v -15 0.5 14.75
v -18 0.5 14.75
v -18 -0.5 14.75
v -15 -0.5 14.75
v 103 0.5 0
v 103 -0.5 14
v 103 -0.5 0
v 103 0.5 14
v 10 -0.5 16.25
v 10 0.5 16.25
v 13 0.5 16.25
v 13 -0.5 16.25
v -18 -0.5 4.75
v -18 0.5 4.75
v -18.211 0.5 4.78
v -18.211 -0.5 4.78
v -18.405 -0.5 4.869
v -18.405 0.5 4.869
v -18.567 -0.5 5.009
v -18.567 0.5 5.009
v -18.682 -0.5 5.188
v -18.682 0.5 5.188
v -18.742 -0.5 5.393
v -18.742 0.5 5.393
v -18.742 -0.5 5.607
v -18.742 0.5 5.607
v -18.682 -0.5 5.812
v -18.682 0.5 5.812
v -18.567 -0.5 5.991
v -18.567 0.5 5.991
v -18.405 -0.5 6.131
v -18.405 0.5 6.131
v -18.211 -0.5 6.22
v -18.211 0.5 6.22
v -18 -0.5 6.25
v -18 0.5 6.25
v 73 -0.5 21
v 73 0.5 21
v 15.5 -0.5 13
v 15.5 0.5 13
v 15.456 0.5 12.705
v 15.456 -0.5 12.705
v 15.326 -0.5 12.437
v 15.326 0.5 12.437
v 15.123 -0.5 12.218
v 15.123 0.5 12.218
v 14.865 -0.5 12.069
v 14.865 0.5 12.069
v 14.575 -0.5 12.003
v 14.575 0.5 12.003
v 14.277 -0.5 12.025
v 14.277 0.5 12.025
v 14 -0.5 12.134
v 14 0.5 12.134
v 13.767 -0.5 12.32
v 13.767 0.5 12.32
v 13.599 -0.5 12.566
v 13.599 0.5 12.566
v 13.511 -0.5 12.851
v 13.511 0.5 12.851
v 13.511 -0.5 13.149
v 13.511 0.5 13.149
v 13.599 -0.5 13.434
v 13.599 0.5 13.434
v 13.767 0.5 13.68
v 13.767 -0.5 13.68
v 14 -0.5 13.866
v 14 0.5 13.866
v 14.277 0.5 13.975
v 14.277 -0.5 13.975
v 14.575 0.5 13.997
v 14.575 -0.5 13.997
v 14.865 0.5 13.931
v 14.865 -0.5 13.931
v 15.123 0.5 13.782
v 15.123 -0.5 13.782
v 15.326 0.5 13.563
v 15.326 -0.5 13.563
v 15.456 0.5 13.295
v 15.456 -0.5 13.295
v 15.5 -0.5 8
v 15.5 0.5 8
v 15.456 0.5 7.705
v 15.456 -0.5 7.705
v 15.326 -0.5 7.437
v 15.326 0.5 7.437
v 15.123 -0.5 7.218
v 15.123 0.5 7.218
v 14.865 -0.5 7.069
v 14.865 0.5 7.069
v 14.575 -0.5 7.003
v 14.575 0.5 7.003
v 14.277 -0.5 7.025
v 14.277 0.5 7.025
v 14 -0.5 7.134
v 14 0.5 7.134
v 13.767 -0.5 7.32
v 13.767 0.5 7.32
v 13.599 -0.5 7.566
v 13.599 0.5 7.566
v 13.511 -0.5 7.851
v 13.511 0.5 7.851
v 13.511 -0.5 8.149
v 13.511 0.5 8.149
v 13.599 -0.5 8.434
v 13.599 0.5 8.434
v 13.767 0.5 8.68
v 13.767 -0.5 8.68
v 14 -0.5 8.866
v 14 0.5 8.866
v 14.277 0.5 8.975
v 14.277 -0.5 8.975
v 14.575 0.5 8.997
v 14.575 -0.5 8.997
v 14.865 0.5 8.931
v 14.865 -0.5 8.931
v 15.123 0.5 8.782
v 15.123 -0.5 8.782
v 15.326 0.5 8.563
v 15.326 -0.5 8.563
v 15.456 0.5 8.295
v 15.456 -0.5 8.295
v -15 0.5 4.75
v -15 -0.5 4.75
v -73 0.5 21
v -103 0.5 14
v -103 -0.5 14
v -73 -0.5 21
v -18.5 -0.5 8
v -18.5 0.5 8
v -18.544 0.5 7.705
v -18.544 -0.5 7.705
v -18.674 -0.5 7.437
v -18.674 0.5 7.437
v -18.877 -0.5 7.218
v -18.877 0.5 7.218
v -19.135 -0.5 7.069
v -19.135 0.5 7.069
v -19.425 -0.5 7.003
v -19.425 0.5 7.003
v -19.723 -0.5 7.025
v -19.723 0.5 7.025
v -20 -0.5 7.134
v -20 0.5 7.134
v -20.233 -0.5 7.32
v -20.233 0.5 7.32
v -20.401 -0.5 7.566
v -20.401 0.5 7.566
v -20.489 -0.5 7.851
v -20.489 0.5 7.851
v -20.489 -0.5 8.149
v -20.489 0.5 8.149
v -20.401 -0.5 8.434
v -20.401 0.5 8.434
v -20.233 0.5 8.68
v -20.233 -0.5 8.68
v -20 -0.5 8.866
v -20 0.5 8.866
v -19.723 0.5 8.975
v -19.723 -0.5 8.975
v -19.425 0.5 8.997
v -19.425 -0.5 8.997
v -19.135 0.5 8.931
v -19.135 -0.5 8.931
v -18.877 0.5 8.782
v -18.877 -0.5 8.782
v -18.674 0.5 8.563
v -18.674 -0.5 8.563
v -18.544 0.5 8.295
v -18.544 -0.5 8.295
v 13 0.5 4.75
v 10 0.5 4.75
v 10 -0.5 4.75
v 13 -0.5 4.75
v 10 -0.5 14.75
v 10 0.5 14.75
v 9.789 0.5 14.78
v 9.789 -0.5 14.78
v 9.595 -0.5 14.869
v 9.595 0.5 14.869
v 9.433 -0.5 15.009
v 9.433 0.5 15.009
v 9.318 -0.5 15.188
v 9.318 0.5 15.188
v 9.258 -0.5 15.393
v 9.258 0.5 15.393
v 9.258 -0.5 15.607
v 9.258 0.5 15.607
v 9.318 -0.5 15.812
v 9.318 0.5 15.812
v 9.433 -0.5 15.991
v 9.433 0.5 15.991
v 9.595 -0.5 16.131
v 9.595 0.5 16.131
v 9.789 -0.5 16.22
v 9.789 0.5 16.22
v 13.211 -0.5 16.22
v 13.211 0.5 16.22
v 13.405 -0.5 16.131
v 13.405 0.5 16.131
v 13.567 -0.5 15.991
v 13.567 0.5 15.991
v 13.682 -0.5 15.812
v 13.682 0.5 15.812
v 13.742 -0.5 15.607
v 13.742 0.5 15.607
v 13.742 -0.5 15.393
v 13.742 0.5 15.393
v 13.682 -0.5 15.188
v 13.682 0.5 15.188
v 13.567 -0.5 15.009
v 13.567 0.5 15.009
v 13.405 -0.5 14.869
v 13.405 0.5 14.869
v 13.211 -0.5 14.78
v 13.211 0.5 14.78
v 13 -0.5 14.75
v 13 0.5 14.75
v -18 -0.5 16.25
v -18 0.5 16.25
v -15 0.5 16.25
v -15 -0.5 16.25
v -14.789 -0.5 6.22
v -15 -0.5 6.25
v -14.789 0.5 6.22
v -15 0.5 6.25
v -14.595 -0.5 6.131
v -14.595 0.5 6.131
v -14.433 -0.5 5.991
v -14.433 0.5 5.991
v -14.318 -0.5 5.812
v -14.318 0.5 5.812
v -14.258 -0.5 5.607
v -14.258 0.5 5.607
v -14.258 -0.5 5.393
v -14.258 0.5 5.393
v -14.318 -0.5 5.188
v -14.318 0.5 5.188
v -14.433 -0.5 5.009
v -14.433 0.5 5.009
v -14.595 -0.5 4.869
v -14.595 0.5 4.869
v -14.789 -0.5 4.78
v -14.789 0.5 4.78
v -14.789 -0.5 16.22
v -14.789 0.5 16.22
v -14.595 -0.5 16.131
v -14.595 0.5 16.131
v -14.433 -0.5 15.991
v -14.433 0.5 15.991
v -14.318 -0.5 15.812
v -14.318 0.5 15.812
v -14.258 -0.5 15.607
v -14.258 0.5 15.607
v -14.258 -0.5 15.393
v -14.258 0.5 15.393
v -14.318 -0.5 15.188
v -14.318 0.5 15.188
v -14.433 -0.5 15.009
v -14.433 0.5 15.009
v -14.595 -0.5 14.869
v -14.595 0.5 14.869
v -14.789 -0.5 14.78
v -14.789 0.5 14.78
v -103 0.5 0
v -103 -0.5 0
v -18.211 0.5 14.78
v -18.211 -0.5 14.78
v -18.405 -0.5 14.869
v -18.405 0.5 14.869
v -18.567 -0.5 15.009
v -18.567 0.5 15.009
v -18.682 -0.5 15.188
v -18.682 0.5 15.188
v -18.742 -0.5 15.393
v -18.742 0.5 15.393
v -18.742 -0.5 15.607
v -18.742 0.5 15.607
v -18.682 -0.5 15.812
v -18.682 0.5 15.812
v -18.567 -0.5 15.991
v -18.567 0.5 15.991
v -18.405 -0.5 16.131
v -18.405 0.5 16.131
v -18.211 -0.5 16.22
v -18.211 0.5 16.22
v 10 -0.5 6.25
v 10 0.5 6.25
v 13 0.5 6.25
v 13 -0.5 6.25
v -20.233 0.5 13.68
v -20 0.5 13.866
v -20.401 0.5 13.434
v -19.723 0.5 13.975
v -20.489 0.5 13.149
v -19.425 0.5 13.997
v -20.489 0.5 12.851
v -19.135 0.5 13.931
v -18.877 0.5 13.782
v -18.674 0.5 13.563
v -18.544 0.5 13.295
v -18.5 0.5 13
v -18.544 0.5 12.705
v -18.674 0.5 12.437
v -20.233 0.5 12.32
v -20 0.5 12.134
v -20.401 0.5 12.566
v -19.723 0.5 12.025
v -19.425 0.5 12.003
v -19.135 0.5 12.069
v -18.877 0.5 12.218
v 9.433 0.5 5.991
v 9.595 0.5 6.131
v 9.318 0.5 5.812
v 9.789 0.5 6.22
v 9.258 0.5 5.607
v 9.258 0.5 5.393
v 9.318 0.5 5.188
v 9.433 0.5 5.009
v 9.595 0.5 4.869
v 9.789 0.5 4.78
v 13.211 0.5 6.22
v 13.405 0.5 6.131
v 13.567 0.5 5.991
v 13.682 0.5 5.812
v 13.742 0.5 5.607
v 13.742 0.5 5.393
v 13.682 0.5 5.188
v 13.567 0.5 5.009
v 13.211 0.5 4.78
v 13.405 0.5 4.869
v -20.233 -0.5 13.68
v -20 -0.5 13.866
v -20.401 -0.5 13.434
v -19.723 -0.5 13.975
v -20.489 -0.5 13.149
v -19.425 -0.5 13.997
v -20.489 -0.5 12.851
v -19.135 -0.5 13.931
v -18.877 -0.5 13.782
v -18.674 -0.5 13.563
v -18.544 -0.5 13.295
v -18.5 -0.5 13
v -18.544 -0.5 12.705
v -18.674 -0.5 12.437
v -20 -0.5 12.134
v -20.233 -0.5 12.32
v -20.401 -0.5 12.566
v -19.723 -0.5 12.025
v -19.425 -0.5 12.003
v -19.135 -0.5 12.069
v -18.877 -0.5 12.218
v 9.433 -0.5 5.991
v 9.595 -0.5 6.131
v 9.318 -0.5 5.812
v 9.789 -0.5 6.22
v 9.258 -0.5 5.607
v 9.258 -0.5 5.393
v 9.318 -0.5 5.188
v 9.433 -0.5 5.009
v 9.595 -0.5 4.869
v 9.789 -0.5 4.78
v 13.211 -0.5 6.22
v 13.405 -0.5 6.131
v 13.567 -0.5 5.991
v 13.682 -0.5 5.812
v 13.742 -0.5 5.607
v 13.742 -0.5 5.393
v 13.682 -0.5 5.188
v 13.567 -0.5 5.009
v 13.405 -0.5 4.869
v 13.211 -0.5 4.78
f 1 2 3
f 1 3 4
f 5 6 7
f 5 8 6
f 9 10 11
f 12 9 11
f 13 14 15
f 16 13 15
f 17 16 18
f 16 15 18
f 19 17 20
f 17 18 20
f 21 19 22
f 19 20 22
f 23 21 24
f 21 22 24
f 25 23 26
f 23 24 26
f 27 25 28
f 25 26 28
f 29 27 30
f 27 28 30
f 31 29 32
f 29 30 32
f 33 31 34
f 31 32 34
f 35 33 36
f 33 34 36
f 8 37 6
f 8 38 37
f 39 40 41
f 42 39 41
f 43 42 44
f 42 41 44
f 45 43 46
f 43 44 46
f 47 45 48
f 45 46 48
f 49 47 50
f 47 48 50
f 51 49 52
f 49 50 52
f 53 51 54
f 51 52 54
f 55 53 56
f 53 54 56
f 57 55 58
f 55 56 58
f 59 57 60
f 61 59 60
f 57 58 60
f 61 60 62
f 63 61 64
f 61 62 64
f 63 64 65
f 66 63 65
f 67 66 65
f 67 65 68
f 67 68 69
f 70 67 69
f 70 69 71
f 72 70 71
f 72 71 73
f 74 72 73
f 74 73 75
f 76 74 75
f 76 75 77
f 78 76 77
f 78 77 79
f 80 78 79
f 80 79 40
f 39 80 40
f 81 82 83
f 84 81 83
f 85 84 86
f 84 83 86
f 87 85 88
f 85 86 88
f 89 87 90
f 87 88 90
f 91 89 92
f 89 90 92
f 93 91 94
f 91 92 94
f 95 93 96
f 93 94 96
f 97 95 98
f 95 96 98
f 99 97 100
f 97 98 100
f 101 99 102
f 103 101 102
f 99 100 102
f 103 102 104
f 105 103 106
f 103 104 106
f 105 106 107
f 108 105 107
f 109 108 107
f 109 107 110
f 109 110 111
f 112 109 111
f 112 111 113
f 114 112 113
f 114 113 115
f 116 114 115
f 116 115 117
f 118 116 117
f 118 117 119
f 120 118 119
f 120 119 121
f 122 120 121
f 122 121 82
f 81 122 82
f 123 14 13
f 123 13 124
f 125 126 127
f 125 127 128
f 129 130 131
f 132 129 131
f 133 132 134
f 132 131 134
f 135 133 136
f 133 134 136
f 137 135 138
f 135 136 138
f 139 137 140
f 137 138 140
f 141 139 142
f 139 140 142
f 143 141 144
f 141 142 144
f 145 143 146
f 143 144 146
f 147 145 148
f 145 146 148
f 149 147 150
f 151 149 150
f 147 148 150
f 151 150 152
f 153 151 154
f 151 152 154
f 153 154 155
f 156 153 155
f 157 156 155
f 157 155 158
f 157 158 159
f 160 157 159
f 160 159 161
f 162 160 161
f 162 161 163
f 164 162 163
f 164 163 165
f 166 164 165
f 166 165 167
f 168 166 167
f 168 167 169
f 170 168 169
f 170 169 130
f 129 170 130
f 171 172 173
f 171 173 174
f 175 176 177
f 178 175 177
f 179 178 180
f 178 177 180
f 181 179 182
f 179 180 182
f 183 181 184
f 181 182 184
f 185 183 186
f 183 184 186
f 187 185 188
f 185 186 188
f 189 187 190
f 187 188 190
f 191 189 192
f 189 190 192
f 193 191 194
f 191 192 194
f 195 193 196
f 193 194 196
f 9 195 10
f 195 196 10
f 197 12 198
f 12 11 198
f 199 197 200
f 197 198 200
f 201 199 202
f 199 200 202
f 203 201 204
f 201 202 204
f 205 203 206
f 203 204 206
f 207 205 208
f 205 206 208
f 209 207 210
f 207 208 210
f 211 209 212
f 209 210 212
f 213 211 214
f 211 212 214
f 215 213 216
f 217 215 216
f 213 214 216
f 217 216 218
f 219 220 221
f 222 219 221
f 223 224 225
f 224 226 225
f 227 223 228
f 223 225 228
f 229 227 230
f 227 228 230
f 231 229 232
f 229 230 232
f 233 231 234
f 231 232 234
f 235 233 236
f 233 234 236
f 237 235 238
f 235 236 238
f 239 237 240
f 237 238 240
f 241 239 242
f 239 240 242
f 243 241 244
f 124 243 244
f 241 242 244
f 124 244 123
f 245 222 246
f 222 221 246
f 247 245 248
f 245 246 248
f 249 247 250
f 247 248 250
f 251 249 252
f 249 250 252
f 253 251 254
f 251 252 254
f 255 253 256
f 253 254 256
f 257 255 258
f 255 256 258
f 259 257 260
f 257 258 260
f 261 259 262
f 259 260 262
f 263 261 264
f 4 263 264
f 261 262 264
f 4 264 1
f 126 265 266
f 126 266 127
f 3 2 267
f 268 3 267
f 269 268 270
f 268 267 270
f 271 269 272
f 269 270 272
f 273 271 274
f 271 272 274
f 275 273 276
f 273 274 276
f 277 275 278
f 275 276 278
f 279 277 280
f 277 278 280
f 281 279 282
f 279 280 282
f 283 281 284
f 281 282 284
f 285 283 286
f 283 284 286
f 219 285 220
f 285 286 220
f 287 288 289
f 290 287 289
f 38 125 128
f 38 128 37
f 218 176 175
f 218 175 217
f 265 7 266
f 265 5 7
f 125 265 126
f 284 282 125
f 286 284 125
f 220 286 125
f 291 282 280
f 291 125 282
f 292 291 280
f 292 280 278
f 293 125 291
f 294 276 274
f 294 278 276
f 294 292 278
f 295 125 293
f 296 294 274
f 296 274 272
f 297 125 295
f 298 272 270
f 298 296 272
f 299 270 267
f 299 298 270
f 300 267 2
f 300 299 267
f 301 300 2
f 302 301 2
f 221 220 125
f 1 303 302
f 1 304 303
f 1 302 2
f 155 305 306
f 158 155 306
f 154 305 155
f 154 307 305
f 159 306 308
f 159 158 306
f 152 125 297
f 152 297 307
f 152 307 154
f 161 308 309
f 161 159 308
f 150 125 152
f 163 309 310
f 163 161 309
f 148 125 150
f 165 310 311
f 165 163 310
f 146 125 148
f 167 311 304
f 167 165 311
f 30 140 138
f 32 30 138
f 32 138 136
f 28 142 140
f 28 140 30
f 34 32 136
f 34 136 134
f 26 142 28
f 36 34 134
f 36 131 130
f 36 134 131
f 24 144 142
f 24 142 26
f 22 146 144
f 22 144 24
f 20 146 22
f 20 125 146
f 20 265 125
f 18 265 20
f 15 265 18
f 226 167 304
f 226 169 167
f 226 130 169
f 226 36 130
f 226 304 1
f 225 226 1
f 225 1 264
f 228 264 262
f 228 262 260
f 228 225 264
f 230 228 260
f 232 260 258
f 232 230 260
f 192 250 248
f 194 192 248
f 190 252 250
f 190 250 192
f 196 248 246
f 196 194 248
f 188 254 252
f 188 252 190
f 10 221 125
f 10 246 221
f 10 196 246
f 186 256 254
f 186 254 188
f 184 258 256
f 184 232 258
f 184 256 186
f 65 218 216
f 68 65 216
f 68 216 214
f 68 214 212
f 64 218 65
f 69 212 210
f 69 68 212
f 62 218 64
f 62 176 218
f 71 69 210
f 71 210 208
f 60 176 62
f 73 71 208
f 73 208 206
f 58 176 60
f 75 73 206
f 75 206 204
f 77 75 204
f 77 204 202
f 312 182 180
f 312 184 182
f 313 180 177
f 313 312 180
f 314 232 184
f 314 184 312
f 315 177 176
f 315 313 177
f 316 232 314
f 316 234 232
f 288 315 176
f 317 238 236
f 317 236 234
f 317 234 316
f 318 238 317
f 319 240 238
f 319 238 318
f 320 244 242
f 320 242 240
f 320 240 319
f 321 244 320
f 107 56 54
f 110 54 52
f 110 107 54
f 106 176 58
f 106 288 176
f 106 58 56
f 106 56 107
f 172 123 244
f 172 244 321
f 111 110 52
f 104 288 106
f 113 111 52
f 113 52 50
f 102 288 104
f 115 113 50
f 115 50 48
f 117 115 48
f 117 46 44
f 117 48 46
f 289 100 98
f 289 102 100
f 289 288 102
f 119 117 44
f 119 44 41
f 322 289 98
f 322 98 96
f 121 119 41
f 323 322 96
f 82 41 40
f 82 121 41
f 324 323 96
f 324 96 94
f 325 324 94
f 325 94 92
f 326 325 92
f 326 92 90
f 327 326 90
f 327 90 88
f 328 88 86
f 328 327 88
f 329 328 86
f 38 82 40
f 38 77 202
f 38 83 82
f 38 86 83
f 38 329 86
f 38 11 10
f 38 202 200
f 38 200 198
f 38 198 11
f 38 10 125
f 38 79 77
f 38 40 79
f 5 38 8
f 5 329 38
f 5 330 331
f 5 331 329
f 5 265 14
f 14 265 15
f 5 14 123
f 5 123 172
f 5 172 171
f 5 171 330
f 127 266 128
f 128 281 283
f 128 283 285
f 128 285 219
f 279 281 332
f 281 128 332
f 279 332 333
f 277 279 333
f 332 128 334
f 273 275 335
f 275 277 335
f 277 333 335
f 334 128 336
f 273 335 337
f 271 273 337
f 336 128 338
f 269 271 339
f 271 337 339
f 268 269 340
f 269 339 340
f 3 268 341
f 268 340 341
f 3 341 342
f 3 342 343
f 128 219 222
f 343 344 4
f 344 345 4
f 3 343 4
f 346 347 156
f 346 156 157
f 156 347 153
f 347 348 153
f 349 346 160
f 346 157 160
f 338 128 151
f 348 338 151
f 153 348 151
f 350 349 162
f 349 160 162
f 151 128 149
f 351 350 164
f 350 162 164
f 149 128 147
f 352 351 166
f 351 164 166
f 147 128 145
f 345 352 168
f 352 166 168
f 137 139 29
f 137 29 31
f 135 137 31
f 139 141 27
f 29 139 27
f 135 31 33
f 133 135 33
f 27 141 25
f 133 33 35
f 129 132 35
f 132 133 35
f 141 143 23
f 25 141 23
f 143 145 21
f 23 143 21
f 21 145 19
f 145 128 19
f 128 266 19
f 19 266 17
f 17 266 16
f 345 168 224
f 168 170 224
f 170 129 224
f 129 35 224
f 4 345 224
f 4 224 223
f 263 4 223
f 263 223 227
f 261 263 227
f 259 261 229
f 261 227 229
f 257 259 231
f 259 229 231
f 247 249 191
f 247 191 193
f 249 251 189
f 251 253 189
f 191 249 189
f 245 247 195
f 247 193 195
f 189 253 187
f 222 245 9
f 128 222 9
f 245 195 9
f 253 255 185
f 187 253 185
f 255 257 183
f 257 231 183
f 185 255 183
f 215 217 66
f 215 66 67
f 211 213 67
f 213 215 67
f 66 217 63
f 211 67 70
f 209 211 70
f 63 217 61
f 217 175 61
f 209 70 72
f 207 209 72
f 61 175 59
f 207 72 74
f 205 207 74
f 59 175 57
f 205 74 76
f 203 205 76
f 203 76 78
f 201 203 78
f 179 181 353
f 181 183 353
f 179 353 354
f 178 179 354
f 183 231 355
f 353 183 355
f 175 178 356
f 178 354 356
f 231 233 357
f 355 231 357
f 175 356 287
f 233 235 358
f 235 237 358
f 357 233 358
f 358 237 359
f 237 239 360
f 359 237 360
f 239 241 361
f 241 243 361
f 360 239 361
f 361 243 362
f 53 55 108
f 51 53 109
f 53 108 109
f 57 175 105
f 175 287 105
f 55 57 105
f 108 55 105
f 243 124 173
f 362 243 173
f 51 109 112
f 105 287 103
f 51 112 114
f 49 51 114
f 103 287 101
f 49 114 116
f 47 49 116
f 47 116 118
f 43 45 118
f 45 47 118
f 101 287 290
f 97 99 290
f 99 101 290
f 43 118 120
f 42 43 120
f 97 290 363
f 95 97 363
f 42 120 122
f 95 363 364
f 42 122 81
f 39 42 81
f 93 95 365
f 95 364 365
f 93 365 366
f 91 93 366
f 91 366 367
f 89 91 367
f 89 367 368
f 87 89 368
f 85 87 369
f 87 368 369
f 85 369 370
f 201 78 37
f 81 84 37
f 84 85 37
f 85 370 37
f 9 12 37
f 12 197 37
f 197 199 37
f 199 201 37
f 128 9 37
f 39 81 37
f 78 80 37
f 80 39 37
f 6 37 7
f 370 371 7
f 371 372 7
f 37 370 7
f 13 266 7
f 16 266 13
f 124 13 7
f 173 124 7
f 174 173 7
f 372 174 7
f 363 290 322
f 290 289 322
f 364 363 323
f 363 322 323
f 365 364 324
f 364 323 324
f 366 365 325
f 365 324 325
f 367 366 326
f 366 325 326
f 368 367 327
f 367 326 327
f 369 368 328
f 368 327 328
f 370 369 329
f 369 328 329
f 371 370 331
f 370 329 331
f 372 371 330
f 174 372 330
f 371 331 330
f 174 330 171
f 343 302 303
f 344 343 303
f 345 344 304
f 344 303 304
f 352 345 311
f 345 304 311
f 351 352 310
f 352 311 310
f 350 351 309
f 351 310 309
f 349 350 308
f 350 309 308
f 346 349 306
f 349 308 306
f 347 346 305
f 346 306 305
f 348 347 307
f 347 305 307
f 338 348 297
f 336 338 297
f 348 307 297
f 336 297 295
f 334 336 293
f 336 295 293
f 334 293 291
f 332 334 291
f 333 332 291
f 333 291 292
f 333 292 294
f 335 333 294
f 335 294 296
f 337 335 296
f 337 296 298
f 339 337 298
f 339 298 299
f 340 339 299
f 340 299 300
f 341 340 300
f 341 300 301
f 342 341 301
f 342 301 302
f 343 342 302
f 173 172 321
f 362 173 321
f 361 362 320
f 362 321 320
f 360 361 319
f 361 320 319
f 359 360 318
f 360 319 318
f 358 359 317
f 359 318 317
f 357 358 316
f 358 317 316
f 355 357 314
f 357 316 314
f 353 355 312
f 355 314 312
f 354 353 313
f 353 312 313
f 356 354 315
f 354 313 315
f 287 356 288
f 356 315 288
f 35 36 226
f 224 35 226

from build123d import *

# Parameters (mm, degrees)
EXTRUDE_1_DEPTH     = 0.5
SKETCH_2_R          = 1
SKETCH_2_W          = 3
SKETCH_2_H          = 1.5
CUT_EXTRUDE_1_DEPTH = 2
SKETCH_3_R          = 0.75
CUT_EXTRUDE_2_DEPTH = 2


with BuildPart() as part:
    # 草图1 → 凸台-拉伸1 (new body, symmetric)
    with BuildSketch(Plane(origin=(0, 0, 0), x_dir=(1, 0, 0), z_dir=(0, 1, 0))):
        Polygon((103, 0), (-103, 0), (-103, -14), (-73, -21), (73, -21), (103, -14), align=None)
    extrude(amount=EXTRUDE_1_DEPTH, both=True)

    # 草图2 → 切除-拉伸1 (cut, through all)
    with BuildSketch(Plane(origin=(0, 0.5, 0), x_dir=(1, 0, 0), z_dir=(0, 1, 0))):
        with Locations((14.5, -13)):
            Circle(SKETCH_2_R)
        with Locations((14.5, -8)):
            Circle(SKETCH_2_R)
        with Locations((-19.5, -8)):
            Circle(SKETCH_2_R)
        with Locations((-19.5, -13)):
            Circle(SKETCH_2_R)
        with Locations((11.5, -5.5)):
            Rectangle(SKETCH_2_W, SKETCH_2_H)
        with Locations((11.5, -15.5)):
            Rectangle(SKETCH_2_W, SKETCH_2_H)
        with Locations((-16.5, -15.5)):
            Rectangle(SKETCH_2_W, SKETCH_2_H)
        with Locations((-16.5, -5.5)):
            Rectangle(SKETCH_2_W, SKETCH_2_H)
    extrude(amount=-CUT_EXTRUDE_1_DEPTH, mode=Mode.SUBTRACT)

    # 草图3 → 切除-拉伸2 (cut, through all)
    with BuildSketch(Plane(origin=(0, 0.5, 0), x_dir=(1, 0, 0), z_dir=(0, 1, 0))):
        with Locations((-18, -5.5)):
            Circle(SKETCH_3_R)
        with Locations((-15, -5.5)):
            Circle(SKETCH_3_R)
        with Locations((-18, -15.5)):
            Circle(SKETCH_3_R)
        with Locations((-15, -15.5)):
            Circle(SKETCH_3_R)
        with Locations((10, -5.5)):
            Circle(SKETCH_3_R)
        with Locations((10, -15.5)):
            Circle(SKETCH_3_R)
        with Locations((13, -15.5)):
            Circle(SKETCH_3_R)
        with Locations((13, -5.5)):
            Circle(SKETCH_3_R)
    extrude(amount=-CUT_EXTRUDE_2_DEPTH, mode=Mode.SUBTRACT)


solid = part.part
